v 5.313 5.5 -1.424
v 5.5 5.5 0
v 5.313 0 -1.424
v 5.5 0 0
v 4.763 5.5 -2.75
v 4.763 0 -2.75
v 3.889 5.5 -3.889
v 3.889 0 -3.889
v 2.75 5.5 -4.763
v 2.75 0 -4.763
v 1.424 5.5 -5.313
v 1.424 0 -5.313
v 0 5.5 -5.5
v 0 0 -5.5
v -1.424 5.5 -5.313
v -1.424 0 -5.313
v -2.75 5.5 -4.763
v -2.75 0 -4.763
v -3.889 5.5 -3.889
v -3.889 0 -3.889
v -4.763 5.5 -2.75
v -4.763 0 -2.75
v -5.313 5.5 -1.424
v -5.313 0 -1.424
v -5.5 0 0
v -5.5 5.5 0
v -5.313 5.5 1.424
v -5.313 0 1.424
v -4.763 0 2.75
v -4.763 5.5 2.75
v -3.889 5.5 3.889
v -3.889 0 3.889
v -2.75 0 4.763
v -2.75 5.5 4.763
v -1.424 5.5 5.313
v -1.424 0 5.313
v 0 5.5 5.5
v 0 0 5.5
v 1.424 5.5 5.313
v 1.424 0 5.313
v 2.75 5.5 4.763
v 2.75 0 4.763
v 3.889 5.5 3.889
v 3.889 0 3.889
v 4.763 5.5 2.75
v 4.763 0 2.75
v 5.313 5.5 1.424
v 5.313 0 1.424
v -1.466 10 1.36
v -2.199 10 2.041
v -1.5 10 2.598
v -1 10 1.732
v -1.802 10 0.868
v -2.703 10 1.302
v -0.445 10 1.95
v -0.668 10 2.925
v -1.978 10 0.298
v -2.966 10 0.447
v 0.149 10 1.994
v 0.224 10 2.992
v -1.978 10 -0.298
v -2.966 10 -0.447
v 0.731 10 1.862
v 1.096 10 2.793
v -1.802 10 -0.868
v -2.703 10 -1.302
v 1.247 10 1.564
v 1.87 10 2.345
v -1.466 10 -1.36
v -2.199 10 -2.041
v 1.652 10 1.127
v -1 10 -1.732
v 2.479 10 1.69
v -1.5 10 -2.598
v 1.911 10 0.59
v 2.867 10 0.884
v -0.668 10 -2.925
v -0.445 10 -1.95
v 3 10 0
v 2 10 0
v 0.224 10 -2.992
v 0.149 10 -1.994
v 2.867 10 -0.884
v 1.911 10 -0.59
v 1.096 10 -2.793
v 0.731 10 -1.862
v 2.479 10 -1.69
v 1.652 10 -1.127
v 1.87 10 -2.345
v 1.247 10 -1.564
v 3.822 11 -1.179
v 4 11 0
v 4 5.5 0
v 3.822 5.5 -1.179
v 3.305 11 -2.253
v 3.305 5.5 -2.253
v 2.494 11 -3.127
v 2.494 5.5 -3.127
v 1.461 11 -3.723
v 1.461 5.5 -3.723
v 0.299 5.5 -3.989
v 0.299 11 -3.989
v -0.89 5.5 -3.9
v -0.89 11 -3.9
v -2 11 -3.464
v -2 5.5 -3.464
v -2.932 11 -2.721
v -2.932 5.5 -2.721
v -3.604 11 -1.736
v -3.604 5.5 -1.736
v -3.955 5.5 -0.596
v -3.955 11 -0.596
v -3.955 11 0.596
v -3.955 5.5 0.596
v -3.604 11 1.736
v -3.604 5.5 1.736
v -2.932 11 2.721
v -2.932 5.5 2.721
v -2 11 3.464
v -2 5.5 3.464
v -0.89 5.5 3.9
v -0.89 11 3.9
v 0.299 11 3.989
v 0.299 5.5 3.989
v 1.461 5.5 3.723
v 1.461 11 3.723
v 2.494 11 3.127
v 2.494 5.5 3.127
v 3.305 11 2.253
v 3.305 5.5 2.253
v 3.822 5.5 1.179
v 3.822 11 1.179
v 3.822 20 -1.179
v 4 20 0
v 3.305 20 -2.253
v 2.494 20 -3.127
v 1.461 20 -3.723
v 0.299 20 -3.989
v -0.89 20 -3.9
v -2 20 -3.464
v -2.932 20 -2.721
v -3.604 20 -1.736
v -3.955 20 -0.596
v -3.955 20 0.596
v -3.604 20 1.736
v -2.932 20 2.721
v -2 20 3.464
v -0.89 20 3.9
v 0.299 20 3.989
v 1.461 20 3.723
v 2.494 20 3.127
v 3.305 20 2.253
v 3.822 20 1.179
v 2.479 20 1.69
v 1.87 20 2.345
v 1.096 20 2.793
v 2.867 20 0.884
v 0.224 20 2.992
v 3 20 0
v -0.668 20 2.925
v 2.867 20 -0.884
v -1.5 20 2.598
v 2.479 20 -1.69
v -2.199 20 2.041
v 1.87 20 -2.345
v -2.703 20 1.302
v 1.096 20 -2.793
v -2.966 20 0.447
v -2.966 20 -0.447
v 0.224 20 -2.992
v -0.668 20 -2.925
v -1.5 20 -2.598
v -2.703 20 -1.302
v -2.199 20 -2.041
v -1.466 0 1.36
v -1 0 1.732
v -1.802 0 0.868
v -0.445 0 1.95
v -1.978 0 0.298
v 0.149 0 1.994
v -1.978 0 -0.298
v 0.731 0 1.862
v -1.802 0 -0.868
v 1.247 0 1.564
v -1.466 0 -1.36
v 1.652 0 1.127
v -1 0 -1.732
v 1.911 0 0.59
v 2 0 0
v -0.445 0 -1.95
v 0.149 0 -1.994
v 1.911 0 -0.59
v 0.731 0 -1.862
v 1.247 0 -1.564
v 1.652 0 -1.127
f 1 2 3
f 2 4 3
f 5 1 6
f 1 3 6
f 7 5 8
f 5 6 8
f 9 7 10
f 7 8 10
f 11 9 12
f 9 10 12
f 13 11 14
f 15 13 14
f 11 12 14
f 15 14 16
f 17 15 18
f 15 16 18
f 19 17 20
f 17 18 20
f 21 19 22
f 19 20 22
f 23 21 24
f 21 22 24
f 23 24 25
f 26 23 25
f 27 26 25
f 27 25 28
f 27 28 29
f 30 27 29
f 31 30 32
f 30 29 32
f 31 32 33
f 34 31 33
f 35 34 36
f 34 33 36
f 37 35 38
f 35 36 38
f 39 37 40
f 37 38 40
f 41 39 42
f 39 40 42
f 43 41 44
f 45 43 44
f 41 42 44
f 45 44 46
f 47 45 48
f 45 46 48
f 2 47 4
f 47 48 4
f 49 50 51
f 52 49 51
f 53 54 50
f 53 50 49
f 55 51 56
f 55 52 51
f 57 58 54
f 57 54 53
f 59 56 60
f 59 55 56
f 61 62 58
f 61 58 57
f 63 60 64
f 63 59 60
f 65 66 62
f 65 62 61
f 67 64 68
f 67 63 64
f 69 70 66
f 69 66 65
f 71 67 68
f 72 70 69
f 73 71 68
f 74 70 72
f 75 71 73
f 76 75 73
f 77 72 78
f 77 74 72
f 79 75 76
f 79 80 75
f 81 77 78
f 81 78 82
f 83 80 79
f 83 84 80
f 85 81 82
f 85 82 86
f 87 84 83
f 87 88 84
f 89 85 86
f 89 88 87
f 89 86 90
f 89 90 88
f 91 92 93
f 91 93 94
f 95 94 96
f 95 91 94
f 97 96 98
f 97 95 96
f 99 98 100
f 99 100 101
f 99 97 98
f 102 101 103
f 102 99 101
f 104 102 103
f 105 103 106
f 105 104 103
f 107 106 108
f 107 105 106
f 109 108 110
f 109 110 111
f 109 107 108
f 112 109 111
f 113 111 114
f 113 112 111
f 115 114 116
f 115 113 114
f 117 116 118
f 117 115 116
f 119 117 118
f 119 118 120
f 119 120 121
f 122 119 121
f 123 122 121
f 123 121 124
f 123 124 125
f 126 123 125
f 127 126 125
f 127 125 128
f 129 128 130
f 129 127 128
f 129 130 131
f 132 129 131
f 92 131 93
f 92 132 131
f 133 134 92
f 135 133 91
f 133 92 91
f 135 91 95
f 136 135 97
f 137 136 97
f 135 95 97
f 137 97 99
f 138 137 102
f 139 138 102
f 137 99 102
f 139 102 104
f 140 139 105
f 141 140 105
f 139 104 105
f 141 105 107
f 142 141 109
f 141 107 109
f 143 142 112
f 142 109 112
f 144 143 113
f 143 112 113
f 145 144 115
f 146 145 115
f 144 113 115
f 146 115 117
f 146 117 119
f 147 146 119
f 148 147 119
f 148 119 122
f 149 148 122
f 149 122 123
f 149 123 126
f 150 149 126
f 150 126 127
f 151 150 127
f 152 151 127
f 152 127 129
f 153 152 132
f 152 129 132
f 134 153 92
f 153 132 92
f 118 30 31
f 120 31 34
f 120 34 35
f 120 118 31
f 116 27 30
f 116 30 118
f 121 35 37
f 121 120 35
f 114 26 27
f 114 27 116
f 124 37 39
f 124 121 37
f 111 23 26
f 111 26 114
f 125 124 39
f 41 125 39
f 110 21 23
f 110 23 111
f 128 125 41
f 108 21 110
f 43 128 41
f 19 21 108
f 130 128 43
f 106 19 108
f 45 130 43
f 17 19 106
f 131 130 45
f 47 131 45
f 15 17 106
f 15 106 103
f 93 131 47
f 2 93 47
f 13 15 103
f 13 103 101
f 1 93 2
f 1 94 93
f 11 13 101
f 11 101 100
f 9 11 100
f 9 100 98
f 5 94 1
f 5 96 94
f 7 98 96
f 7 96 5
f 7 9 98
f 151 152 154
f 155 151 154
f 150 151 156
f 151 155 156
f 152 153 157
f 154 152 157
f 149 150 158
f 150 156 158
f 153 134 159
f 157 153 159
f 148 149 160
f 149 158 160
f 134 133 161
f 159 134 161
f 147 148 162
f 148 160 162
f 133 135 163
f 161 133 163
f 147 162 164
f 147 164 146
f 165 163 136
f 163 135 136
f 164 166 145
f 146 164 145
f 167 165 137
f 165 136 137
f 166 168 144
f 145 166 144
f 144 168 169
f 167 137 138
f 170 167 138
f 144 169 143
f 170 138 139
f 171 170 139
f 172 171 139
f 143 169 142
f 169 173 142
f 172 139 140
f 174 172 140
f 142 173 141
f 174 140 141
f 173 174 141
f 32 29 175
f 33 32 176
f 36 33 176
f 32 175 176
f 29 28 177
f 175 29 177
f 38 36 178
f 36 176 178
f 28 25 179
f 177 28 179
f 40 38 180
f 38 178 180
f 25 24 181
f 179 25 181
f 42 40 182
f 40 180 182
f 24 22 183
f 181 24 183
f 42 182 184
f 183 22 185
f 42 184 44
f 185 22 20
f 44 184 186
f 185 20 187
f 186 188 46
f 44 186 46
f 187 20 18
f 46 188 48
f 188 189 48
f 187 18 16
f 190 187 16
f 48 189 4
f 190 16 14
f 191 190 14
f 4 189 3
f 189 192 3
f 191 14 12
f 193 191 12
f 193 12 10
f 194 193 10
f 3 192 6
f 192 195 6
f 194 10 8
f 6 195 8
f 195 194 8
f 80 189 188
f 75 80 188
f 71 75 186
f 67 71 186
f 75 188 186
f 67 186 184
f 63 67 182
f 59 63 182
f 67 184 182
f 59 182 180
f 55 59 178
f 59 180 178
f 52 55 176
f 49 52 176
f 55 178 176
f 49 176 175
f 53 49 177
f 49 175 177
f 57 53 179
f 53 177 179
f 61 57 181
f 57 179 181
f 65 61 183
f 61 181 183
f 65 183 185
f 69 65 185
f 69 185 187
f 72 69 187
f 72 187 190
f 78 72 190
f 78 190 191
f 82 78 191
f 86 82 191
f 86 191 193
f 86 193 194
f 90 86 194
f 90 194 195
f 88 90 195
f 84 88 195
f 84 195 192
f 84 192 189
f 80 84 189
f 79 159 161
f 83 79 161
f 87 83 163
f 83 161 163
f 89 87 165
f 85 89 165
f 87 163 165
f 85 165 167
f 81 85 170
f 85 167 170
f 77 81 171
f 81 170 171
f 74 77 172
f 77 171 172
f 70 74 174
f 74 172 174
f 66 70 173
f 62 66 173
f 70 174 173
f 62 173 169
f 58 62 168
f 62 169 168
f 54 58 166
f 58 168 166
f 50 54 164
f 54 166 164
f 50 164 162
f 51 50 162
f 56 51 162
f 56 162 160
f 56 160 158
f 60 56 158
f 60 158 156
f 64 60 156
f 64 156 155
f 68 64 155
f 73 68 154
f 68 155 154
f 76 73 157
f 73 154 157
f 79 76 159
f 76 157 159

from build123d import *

# Parameters (mm, degrees)
SKETCH_2_R          = 3
CUT_EXTRUDE_1_DEPTH = 10
SKETCH_3_R          = 2
CUT_EXTRUDE_2_DEPTH = 21
SKETCH_4_R          = 5.5
SKETCH_4_R_2        = 4
CUT_EXTRUDE_3_DEPTH = 5.5


with BuildPart() as part:
    # Эскиз1 → Повернуть1 (revolve)
    with BuildSketch(Plane.XY):
        Polygon((4, 20), (4, 11), (5.5, 11), (5.5, 0), (0, 0), (0, 20), align=None)
    revolve(axis=Axis((0, 0, 0), (0, 1, 0)))

    # Эскиз2 → Вырез-Вытянуть1 (cut)
    with BuildSketch(Plane(origin=(0, 20, 0), x_dir=(1, 0, 0), z_dir=(0, 1, 0))):
        Circle(SKETCH_2_R)
    extrude(amount=-CUT_EXTRUDE_1_DEPTH, mode=Mode.SUBTRACT)

    # Эскиз3 → Вырез-Вытянуть2 (cut, through all)
    with BuildSketch(Plane.XZ):
        Circle(SKETCH_3_R)
    extrude(amount=-CUT_EXTRUDE_2_DEPTH, mode=Mode.SUBTRACT)

    # Эскиз4 → Вырез-Вытянуть3 (cut)
    with BuildSketch(Plane(origin=(0, 11, 0), x_dir=(1, 0, 0), z_dir=(0, 1, 0))):
        Circle(SKETCH_4_R)
        Circle(SKETCH_4_R_2, mode=Mode.SUBTRACT)
    extrude(amount=-CUT_EXTRUDE_3_DEPTH, mode=Mode.SUBTRACT)


solid = part.part
